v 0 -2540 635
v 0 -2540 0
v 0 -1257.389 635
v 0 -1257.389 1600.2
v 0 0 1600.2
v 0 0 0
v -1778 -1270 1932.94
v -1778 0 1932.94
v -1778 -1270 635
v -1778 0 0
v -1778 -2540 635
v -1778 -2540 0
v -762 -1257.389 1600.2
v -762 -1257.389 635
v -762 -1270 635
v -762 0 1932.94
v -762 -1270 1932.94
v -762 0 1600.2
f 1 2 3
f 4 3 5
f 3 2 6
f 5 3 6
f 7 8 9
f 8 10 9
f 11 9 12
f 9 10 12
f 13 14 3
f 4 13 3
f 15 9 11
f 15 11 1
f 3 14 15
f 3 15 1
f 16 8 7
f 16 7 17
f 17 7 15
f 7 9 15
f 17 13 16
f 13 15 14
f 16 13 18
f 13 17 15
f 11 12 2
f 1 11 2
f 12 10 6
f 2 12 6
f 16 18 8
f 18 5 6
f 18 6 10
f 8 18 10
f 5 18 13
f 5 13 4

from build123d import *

# Parameters (mm, degrees)
F0_W     = 1778
F0_H     = 2540
F1_DEPTH = 635
F2_W     = 1016
F2_H     = 1270
F3_DEPTH = 635
F5_W     = 762
F5_H     = 1257.3888301849
F7_DEPTH = 965.2
F9_DEPTH = 662.94


with BuildPart() as f1:
    # F0 (on Top) → F1 (new body)
    with BuildSketch(Plane.XY):
        with Locations((-889, -1270)):
            Rectangle(F0_W, F0_H)
    extrude(amount=F1_DEPTH)

    # F2 (on face) → F3 (join)
    with BuildSketch(Plane.XY.offset(635)):
        with Locations((-1270, -635)):
            Rectangle(F2_W, F2_H)
    extrude(amount=F3_DEPTH)

    # F5 (on face) → F7 (join)
    with BuildSketch(Plane.XY.offset(635)):
        with Locations((-381, -628.6944150925)):
            Rectangle(F5_W, F5_H)
    extrude(amount=F7_DEPTH)

    # F8 (on face) → F9 (join)
    with BuildSketch(Plane.XY.offset(1270)):
        Polygon((-762, -1257.3888301849), (-762, 0), (-1778, 0), (-1778, -1270), (-762, -1270), align=None)
    extrude(amount=F9_DEPTH)


solid = f1.part
